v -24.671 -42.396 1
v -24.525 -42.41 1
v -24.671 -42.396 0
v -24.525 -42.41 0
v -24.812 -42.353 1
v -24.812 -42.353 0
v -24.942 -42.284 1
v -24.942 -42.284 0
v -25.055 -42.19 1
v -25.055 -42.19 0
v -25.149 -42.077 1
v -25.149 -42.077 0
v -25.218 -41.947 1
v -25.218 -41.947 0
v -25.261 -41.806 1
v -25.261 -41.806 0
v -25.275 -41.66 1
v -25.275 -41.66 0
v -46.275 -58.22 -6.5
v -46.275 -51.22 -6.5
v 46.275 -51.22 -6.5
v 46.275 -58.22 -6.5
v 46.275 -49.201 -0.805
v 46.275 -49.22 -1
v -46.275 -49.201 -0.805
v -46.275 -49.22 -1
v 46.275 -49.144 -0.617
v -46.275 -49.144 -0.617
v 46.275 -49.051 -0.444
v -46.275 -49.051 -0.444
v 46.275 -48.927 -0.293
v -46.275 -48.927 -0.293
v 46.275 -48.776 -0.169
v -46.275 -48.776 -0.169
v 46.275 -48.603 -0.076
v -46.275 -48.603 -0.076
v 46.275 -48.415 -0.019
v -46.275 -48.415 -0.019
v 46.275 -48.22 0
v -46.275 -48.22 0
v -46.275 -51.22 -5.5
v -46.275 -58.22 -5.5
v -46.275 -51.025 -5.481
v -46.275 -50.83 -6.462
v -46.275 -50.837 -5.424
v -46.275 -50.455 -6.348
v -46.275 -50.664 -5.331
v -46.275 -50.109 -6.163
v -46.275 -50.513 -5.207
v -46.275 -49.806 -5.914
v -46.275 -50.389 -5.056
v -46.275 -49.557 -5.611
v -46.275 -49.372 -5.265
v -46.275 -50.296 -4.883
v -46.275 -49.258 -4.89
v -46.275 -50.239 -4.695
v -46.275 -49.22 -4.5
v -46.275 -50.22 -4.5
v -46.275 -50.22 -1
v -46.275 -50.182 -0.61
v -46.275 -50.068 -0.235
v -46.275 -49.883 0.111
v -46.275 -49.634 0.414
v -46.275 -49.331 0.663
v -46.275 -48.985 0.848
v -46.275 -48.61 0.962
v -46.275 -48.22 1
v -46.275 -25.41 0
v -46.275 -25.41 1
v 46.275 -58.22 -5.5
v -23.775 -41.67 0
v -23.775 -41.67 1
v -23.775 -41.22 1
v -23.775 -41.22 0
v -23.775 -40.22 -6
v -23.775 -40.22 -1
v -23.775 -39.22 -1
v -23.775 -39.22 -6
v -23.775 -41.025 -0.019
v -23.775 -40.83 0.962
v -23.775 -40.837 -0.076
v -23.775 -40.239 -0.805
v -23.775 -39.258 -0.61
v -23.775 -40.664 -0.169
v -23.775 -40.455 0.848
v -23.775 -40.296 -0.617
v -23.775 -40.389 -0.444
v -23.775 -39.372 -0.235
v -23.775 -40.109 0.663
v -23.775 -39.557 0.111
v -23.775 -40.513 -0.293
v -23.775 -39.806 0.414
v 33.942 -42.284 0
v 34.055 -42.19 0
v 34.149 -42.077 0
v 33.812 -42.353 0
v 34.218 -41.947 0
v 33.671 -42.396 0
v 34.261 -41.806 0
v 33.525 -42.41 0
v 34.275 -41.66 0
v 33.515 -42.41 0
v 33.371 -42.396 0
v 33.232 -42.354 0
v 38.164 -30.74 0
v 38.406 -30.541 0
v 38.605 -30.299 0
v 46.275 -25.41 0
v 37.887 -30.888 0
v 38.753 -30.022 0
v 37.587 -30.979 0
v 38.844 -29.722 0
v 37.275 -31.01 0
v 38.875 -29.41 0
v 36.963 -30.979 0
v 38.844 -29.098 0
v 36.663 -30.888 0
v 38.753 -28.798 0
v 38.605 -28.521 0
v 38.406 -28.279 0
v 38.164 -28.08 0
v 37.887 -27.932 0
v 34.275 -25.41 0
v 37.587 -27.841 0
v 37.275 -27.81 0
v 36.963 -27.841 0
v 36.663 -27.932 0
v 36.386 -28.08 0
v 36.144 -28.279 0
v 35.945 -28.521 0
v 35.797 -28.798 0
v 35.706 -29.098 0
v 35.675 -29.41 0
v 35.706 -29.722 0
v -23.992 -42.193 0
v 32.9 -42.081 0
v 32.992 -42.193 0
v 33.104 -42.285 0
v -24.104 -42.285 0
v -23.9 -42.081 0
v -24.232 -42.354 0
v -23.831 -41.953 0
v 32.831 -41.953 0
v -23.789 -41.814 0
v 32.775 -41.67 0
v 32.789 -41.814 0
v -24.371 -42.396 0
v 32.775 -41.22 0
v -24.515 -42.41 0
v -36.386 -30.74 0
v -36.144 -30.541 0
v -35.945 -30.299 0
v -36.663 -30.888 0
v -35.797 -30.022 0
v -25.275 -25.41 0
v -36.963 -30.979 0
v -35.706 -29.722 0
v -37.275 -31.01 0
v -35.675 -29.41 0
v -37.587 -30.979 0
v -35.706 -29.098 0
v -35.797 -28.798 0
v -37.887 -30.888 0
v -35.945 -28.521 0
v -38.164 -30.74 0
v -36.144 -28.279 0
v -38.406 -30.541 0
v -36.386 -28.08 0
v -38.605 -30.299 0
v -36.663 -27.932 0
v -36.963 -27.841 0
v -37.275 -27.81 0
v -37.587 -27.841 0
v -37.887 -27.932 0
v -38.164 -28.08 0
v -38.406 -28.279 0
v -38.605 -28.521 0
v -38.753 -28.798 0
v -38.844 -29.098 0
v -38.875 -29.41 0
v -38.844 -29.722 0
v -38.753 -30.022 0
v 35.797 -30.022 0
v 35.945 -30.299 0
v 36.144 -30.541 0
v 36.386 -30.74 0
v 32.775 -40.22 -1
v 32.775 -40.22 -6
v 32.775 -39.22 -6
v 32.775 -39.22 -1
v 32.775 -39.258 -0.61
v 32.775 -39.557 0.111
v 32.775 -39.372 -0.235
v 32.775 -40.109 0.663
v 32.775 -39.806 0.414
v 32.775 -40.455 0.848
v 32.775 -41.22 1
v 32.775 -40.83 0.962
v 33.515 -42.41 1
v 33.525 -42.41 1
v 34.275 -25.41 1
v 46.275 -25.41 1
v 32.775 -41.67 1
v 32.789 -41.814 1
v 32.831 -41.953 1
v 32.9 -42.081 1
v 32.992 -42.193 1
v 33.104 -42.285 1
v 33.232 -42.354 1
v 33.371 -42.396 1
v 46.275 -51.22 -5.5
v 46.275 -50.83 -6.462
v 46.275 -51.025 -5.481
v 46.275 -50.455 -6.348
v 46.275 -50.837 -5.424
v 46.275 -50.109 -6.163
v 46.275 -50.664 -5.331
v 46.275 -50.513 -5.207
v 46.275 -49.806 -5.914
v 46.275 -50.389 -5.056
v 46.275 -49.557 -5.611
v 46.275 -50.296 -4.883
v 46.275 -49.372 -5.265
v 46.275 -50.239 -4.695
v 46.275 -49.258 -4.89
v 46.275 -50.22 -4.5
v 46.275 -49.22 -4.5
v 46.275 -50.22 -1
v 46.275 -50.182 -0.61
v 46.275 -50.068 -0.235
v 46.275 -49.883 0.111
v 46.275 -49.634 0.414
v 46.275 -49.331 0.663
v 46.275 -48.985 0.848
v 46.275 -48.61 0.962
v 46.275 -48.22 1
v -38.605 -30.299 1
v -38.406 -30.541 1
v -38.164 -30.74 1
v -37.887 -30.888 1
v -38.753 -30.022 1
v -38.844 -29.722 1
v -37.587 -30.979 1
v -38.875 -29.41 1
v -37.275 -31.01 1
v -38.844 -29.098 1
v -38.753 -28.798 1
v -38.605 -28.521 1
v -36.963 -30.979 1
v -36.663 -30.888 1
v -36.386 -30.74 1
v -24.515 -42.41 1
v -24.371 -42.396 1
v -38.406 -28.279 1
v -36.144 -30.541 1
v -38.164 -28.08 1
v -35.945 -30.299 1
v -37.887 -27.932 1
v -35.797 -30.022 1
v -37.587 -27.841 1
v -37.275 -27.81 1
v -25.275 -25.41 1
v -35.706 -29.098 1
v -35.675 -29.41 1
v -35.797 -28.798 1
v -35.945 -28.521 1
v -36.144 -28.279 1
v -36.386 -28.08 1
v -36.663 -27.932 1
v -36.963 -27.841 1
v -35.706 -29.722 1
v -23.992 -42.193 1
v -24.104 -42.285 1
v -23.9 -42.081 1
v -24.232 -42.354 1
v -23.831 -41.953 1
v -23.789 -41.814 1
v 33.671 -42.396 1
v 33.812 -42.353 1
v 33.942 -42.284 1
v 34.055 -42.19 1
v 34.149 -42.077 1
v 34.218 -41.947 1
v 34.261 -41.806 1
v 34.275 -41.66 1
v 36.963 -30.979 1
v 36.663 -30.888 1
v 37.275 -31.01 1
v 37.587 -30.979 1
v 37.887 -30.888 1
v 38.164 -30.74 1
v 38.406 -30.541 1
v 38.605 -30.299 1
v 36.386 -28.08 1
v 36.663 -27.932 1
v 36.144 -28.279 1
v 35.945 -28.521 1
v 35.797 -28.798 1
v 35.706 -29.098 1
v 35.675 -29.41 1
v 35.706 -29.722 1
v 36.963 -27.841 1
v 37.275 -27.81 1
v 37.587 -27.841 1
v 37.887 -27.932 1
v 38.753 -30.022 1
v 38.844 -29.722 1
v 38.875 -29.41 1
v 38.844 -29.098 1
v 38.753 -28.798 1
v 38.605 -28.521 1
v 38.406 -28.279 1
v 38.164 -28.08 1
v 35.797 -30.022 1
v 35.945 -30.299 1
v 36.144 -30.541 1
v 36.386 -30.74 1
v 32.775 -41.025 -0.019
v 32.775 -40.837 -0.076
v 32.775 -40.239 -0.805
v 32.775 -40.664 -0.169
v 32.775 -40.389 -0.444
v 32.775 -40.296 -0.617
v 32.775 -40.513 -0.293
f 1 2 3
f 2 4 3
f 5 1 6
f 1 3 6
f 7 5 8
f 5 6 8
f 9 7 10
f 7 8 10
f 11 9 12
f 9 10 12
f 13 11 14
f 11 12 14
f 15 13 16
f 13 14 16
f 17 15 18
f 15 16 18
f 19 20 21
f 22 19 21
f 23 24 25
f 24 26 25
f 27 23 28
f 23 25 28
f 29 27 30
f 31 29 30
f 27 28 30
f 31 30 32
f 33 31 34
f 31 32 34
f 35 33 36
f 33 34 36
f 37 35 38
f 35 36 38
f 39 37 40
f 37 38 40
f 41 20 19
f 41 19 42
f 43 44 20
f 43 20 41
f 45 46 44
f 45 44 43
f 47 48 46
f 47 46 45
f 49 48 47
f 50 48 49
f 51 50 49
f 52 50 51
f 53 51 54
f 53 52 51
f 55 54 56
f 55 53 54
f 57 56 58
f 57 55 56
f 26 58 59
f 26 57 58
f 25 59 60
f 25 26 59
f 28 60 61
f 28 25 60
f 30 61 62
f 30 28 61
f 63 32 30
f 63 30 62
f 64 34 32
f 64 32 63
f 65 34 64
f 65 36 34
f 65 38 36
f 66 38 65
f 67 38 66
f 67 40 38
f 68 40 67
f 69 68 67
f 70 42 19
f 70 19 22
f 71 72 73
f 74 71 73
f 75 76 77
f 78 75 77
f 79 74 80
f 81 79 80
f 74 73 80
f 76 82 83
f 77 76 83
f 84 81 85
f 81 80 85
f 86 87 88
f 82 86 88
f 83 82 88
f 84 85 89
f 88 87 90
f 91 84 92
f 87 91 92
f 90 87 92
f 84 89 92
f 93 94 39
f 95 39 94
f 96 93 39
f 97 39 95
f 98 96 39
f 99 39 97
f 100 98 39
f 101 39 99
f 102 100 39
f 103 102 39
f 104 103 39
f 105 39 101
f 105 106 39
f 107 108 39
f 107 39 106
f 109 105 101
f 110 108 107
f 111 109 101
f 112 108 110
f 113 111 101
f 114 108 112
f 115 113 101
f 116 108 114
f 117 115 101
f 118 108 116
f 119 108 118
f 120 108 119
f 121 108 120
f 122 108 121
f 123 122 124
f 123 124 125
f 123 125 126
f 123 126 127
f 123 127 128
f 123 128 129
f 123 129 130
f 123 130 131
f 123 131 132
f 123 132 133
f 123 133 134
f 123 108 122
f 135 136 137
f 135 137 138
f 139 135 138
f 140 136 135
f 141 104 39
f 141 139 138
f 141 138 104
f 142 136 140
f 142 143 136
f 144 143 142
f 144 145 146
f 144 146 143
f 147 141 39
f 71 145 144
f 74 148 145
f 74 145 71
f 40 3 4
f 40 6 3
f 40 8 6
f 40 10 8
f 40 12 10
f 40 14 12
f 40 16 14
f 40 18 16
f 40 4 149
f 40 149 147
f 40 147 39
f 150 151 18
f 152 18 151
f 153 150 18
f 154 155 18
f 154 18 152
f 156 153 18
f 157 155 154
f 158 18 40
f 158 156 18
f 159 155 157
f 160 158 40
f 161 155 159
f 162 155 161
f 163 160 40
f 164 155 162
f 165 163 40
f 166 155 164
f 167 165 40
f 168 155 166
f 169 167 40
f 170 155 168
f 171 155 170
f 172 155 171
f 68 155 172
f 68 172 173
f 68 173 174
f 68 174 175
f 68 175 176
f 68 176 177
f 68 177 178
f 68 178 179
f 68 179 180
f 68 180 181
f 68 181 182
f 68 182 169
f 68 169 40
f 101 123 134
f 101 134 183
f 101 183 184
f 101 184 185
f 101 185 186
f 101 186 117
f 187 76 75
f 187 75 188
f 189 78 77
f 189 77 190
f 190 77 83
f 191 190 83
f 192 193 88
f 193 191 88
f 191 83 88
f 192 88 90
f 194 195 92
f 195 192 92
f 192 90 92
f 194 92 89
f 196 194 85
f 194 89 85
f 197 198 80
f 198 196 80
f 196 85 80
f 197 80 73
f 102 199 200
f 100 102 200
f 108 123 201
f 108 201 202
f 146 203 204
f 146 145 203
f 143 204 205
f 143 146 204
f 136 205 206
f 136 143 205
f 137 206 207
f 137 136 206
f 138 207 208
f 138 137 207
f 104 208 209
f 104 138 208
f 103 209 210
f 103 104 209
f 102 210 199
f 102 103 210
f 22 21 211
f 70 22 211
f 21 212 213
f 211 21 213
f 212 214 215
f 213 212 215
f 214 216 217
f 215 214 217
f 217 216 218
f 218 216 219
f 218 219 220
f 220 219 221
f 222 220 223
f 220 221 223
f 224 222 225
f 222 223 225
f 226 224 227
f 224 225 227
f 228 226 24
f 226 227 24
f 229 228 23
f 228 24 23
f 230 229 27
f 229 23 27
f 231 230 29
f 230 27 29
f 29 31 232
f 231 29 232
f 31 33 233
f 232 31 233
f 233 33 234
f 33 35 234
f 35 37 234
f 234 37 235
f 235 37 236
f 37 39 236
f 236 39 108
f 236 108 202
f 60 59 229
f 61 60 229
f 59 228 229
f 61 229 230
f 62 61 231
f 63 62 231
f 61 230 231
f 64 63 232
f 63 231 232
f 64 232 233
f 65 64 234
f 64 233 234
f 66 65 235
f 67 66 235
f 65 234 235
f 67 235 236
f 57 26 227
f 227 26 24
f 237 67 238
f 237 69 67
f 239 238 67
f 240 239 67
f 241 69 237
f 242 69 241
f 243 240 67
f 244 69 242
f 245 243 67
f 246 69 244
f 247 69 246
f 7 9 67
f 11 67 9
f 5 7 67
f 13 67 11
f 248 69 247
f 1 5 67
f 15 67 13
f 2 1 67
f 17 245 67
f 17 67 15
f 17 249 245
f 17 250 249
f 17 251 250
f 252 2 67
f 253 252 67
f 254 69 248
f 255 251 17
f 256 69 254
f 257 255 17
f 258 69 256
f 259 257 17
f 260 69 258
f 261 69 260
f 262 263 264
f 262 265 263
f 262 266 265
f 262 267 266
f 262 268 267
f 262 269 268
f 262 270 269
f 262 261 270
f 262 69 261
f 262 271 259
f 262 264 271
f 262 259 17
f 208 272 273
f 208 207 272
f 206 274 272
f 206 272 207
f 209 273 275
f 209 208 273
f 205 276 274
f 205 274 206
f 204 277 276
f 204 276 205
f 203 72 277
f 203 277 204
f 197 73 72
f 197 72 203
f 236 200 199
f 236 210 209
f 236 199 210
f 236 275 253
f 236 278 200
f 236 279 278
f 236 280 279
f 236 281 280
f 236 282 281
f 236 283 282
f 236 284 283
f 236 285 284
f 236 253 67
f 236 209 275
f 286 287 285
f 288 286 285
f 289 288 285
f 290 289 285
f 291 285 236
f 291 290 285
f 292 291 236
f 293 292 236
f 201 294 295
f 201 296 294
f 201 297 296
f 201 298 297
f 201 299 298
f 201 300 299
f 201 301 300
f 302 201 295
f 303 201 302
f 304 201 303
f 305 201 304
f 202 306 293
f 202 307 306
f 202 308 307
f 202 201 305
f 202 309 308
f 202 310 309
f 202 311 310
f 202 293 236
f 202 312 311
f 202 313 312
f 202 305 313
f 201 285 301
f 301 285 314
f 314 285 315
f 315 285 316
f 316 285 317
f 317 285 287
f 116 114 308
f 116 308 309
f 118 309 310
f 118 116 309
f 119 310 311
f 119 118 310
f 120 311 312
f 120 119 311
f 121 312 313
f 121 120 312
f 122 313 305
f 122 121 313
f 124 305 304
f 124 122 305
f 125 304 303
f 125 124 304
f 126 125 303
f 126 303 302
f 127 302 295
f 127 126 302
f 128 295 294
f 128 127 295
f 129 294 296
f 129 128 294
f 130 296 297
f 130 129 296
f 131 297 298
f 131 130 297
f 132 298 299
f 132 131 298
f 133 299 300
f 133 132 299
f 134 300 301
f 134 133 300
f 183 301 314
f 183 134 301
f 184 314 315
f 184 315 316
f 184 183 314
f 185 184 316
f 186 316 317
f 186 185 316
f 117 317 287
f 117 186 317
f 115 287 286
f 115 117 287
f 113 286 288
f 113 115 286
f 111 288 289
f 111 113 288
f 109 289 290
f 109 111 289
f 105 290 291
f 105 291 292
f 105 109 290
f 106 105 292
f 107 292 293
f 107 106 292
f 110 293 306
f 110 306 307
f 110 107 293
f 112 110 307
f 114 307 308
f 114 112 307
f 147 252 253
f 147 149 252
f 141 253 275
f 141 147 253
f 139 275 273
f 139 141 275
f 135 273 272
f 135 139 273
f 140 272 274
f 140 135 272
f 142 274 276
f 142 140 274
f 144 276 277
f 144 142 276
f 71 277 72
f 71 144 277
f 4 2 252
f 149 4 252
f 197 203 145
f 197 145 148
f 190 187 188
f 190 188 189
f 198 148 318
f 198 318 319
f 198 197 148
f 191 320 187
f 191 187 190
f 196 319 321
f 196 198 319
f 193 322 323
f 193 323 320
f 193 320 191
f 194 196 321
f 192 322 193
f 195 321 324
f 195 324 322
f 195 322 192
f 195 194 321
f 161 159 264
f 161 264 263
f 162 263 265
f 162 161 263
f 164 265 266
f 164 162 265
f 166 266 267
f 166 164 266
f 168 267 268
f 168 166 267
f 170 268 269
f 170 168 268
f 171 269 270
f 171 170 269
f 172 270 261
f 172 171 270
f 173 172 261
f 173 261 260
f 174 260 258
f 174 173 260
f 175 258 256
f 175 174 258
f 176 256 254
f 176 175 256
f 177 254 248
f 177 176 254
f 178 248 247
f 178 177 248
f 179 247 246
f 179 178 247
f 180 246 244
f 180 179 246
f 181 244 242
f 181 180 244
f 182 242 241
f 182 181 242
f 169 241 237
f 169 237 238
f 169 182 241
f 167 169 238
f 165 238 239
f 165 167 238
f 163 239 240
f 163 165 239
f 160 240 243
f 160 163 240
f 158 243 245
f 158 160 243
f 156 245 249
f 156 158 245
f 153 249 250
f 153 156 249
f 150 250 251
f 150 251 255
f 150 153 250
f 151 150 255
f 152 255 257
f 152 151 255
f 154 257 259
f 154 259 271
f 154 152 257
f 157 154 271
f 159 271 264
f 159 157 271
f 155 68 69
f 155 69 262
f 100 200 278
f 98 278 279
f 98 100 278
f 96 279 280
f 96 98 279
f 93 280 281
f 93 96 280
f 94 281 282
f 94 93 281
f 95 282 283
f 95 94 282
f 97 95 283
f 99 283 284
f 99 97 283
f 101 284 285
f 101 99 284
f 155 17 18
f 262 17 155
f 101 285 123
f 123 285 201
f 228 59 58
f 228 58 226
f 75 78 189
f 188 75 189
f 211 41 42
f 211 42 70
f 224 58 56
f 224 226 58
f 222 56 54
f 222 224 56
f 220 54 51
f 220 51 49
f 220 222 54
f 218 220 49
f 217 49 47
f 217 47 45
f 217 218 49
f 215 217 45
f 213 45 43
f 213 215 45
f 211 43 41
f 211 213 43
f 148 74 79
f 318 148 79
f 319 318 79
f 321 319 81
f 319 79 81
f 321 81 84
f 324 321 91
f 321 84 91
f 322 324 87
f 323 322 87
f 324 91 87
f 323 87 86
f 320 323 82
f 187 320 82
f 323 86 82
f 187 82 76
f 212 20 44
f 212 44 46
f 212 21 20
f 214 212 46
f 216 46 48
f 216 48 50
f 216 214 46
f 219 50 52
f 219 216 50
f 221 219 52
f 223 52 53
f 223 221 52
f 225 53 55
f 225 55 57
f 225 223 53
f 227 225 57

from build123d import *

# Parameters (mm, degrees)
ESQUISSE1_R             = 1.6
EXTRUSION1_DEPTH        = 1
ESQUISSE2_W             = 59.55
ESQUISSE2_H             = 1
EXTRUSION2_DEPTH        = 7
ESQUISSE3_W             = 92.55
ESQUISSE3_H             = 1
EXTRUSION3_DEPTH        = 7.5
ESQUISSE4_W             = 92.55
ESQUISSE4_H             = 1
EXTRUSION4_DEPTH        = 8
CONG_1_R                = 1
CONG_2_R                = 2
CONG_3_R                = 1
CONG_4_R                = 2
ESQUISSE5_W             = 1.5
ESQUISSE5_H             = 17
ENL_V_MAT_EXTRU_1_DEPTH = 10
CONG_5_R                = 0.75
CONG_6_R                = 0.74
CONG_7_R                = 0.74
CONG_8_R                = 0.75


with BuildPart() as part:
    # Esquisse1 → Extrusion1 (new body)
    with BuildSketch(Plane.XY):
        Polygon((-46.275, -25.41), (-25.275, -25.41), (-25.275, -39.22), (34.275, -39.22), (34.275, -25.41), (46.275, -25.41), (46.275, -49.22), (-46.275, -49.22), align=None)
        with Locations((37.275, -29.41)):
            Circle(ESQUISSE1_R, mode=Mode.SUBTRACT)
        with Locations((-37.275, -29.41)):
            Circle(ESQUISSE1_R, mode=Mode.SUBTRACT)
    extrude(amount=EXTRUSION1_DEPTH)

    # Esquisse2 → Extrusion2 (add)
    with BuildSketch(Plane.XY.offset(1)):
        with Locations((4.5, -39.72)):
            Rectangle(ESQUISSE2_W, ESQUISSE2_H)
    extrude(amount=-EXTRUSION2_DEPTH)

    # Esquisse3 → Extrusion3 (add)
    with BuildSketch(Plane.XY.offset(1)):
        with Locations((0, -49.72)):
            Rectangle(ESQUISSE3_W, ESQUISSE3_H)
    extrude(amount=-EXTRUSION3_DEPTH)

    # Esquisse4 → Extrusion4 (add)
    with BuildSketch(Plane.XZ.offset(50.22)):
        with Locations((0, -6)):
            Rectangle(ESQUISSE4_W, ESQUISSE4_H)
    extrude(amount=EXTRUSION4_DEPTH)

    # Congé1
    cong_1_edges = [part.edges().sort_by_distance(p)[0] for p in [
        (0, -50.22, -5.5),
        (0, -49.22, 0),
    ]]
    fillet(cong_1_edges, radius=CONG_1_R)

    # Congé2
    cong_2_edges = [part.edges().sort_by_distance(p)[0] for p in [
        (0, -49.22, -6.5),
        (0, -50.22, 1),
    ]]
    fillet(cong_2_edges, radius=CONG_2_R)

    # Congé3
    cong_3_edges = [part.edges().sort_by_distance(p)[0] for p in [
        (4.5, -40.22, 0),
    ]]
    fillet(cong_3_edges, radius=CONG_3_R)

    # Congé4
    # the kernel refuses this fillet: 2 mm, written as the material it takes off along each edge
    with BuildSketch(Plane(origin=(-25.275, -39.22, 1), x_dir=(0, -1, 0), z_dir=(1, 0, 0))) as cong_4_piece_1:
        with BuildLine():
            CenterArc((CONG_4_R, CONG_4_R), CONG_4_R, 180, 90)
            Line((0, CONG_4_R), (0, 0))
            Line((0, 0), (CONG_4_R, 0))
        make_face()
    extrude(amount=59.55, mode=Mode.SUBTRACT)

    # Esquisse5 → Enlèv. mat.-Extru.1 (cut)
    with BuildSketch(Plane.XY.offset(1)):
        with Locations((-24.525, -33.91)):
            Rectangle(ESQUISSE5_W, ESQUISSE5_H)
        with Locations((33.525, -33.91)):
            Rectangle(ESQUISSE5_W, ESQUISSE5_H)
    extrude(amount=-ENL_V_MAT_EXTRU_1_DEPTH, mode=Mode.SUBTRACT)

    # Congé5
    cong_5_edges = [part.edges().sort_by_distance(p)[0] for p in [
        (-25.275, -42.41, 0.5),
    ]]
    fillet(cong_5_edges, radius=CONG_5_R)

    # Congé6
    cong_6_edges = [part.edges().sort_by_distance(p)[0] for p in [
        (-23.775, -42.41, 0.5),
    ]]
    fillet(cong_6_edges, radius=CONG_6_R)

    # Congé7
    cong_7_edges = [part.edges().sort_by_distance(p)[0] for p in [
        (32.775, -42.41, 0.5),
    ]]
    fillet(cong_7_edges, radius=CONG_7_R)

    # Congé8
    cong_8_edges = [part.edges().sort_by_distance(p)[0] for p in [
        (34.275, -42.41, 0.5),
    ]]
    fillet(cong_8_edges, radius=CONG_8_R)


solid = part.part
